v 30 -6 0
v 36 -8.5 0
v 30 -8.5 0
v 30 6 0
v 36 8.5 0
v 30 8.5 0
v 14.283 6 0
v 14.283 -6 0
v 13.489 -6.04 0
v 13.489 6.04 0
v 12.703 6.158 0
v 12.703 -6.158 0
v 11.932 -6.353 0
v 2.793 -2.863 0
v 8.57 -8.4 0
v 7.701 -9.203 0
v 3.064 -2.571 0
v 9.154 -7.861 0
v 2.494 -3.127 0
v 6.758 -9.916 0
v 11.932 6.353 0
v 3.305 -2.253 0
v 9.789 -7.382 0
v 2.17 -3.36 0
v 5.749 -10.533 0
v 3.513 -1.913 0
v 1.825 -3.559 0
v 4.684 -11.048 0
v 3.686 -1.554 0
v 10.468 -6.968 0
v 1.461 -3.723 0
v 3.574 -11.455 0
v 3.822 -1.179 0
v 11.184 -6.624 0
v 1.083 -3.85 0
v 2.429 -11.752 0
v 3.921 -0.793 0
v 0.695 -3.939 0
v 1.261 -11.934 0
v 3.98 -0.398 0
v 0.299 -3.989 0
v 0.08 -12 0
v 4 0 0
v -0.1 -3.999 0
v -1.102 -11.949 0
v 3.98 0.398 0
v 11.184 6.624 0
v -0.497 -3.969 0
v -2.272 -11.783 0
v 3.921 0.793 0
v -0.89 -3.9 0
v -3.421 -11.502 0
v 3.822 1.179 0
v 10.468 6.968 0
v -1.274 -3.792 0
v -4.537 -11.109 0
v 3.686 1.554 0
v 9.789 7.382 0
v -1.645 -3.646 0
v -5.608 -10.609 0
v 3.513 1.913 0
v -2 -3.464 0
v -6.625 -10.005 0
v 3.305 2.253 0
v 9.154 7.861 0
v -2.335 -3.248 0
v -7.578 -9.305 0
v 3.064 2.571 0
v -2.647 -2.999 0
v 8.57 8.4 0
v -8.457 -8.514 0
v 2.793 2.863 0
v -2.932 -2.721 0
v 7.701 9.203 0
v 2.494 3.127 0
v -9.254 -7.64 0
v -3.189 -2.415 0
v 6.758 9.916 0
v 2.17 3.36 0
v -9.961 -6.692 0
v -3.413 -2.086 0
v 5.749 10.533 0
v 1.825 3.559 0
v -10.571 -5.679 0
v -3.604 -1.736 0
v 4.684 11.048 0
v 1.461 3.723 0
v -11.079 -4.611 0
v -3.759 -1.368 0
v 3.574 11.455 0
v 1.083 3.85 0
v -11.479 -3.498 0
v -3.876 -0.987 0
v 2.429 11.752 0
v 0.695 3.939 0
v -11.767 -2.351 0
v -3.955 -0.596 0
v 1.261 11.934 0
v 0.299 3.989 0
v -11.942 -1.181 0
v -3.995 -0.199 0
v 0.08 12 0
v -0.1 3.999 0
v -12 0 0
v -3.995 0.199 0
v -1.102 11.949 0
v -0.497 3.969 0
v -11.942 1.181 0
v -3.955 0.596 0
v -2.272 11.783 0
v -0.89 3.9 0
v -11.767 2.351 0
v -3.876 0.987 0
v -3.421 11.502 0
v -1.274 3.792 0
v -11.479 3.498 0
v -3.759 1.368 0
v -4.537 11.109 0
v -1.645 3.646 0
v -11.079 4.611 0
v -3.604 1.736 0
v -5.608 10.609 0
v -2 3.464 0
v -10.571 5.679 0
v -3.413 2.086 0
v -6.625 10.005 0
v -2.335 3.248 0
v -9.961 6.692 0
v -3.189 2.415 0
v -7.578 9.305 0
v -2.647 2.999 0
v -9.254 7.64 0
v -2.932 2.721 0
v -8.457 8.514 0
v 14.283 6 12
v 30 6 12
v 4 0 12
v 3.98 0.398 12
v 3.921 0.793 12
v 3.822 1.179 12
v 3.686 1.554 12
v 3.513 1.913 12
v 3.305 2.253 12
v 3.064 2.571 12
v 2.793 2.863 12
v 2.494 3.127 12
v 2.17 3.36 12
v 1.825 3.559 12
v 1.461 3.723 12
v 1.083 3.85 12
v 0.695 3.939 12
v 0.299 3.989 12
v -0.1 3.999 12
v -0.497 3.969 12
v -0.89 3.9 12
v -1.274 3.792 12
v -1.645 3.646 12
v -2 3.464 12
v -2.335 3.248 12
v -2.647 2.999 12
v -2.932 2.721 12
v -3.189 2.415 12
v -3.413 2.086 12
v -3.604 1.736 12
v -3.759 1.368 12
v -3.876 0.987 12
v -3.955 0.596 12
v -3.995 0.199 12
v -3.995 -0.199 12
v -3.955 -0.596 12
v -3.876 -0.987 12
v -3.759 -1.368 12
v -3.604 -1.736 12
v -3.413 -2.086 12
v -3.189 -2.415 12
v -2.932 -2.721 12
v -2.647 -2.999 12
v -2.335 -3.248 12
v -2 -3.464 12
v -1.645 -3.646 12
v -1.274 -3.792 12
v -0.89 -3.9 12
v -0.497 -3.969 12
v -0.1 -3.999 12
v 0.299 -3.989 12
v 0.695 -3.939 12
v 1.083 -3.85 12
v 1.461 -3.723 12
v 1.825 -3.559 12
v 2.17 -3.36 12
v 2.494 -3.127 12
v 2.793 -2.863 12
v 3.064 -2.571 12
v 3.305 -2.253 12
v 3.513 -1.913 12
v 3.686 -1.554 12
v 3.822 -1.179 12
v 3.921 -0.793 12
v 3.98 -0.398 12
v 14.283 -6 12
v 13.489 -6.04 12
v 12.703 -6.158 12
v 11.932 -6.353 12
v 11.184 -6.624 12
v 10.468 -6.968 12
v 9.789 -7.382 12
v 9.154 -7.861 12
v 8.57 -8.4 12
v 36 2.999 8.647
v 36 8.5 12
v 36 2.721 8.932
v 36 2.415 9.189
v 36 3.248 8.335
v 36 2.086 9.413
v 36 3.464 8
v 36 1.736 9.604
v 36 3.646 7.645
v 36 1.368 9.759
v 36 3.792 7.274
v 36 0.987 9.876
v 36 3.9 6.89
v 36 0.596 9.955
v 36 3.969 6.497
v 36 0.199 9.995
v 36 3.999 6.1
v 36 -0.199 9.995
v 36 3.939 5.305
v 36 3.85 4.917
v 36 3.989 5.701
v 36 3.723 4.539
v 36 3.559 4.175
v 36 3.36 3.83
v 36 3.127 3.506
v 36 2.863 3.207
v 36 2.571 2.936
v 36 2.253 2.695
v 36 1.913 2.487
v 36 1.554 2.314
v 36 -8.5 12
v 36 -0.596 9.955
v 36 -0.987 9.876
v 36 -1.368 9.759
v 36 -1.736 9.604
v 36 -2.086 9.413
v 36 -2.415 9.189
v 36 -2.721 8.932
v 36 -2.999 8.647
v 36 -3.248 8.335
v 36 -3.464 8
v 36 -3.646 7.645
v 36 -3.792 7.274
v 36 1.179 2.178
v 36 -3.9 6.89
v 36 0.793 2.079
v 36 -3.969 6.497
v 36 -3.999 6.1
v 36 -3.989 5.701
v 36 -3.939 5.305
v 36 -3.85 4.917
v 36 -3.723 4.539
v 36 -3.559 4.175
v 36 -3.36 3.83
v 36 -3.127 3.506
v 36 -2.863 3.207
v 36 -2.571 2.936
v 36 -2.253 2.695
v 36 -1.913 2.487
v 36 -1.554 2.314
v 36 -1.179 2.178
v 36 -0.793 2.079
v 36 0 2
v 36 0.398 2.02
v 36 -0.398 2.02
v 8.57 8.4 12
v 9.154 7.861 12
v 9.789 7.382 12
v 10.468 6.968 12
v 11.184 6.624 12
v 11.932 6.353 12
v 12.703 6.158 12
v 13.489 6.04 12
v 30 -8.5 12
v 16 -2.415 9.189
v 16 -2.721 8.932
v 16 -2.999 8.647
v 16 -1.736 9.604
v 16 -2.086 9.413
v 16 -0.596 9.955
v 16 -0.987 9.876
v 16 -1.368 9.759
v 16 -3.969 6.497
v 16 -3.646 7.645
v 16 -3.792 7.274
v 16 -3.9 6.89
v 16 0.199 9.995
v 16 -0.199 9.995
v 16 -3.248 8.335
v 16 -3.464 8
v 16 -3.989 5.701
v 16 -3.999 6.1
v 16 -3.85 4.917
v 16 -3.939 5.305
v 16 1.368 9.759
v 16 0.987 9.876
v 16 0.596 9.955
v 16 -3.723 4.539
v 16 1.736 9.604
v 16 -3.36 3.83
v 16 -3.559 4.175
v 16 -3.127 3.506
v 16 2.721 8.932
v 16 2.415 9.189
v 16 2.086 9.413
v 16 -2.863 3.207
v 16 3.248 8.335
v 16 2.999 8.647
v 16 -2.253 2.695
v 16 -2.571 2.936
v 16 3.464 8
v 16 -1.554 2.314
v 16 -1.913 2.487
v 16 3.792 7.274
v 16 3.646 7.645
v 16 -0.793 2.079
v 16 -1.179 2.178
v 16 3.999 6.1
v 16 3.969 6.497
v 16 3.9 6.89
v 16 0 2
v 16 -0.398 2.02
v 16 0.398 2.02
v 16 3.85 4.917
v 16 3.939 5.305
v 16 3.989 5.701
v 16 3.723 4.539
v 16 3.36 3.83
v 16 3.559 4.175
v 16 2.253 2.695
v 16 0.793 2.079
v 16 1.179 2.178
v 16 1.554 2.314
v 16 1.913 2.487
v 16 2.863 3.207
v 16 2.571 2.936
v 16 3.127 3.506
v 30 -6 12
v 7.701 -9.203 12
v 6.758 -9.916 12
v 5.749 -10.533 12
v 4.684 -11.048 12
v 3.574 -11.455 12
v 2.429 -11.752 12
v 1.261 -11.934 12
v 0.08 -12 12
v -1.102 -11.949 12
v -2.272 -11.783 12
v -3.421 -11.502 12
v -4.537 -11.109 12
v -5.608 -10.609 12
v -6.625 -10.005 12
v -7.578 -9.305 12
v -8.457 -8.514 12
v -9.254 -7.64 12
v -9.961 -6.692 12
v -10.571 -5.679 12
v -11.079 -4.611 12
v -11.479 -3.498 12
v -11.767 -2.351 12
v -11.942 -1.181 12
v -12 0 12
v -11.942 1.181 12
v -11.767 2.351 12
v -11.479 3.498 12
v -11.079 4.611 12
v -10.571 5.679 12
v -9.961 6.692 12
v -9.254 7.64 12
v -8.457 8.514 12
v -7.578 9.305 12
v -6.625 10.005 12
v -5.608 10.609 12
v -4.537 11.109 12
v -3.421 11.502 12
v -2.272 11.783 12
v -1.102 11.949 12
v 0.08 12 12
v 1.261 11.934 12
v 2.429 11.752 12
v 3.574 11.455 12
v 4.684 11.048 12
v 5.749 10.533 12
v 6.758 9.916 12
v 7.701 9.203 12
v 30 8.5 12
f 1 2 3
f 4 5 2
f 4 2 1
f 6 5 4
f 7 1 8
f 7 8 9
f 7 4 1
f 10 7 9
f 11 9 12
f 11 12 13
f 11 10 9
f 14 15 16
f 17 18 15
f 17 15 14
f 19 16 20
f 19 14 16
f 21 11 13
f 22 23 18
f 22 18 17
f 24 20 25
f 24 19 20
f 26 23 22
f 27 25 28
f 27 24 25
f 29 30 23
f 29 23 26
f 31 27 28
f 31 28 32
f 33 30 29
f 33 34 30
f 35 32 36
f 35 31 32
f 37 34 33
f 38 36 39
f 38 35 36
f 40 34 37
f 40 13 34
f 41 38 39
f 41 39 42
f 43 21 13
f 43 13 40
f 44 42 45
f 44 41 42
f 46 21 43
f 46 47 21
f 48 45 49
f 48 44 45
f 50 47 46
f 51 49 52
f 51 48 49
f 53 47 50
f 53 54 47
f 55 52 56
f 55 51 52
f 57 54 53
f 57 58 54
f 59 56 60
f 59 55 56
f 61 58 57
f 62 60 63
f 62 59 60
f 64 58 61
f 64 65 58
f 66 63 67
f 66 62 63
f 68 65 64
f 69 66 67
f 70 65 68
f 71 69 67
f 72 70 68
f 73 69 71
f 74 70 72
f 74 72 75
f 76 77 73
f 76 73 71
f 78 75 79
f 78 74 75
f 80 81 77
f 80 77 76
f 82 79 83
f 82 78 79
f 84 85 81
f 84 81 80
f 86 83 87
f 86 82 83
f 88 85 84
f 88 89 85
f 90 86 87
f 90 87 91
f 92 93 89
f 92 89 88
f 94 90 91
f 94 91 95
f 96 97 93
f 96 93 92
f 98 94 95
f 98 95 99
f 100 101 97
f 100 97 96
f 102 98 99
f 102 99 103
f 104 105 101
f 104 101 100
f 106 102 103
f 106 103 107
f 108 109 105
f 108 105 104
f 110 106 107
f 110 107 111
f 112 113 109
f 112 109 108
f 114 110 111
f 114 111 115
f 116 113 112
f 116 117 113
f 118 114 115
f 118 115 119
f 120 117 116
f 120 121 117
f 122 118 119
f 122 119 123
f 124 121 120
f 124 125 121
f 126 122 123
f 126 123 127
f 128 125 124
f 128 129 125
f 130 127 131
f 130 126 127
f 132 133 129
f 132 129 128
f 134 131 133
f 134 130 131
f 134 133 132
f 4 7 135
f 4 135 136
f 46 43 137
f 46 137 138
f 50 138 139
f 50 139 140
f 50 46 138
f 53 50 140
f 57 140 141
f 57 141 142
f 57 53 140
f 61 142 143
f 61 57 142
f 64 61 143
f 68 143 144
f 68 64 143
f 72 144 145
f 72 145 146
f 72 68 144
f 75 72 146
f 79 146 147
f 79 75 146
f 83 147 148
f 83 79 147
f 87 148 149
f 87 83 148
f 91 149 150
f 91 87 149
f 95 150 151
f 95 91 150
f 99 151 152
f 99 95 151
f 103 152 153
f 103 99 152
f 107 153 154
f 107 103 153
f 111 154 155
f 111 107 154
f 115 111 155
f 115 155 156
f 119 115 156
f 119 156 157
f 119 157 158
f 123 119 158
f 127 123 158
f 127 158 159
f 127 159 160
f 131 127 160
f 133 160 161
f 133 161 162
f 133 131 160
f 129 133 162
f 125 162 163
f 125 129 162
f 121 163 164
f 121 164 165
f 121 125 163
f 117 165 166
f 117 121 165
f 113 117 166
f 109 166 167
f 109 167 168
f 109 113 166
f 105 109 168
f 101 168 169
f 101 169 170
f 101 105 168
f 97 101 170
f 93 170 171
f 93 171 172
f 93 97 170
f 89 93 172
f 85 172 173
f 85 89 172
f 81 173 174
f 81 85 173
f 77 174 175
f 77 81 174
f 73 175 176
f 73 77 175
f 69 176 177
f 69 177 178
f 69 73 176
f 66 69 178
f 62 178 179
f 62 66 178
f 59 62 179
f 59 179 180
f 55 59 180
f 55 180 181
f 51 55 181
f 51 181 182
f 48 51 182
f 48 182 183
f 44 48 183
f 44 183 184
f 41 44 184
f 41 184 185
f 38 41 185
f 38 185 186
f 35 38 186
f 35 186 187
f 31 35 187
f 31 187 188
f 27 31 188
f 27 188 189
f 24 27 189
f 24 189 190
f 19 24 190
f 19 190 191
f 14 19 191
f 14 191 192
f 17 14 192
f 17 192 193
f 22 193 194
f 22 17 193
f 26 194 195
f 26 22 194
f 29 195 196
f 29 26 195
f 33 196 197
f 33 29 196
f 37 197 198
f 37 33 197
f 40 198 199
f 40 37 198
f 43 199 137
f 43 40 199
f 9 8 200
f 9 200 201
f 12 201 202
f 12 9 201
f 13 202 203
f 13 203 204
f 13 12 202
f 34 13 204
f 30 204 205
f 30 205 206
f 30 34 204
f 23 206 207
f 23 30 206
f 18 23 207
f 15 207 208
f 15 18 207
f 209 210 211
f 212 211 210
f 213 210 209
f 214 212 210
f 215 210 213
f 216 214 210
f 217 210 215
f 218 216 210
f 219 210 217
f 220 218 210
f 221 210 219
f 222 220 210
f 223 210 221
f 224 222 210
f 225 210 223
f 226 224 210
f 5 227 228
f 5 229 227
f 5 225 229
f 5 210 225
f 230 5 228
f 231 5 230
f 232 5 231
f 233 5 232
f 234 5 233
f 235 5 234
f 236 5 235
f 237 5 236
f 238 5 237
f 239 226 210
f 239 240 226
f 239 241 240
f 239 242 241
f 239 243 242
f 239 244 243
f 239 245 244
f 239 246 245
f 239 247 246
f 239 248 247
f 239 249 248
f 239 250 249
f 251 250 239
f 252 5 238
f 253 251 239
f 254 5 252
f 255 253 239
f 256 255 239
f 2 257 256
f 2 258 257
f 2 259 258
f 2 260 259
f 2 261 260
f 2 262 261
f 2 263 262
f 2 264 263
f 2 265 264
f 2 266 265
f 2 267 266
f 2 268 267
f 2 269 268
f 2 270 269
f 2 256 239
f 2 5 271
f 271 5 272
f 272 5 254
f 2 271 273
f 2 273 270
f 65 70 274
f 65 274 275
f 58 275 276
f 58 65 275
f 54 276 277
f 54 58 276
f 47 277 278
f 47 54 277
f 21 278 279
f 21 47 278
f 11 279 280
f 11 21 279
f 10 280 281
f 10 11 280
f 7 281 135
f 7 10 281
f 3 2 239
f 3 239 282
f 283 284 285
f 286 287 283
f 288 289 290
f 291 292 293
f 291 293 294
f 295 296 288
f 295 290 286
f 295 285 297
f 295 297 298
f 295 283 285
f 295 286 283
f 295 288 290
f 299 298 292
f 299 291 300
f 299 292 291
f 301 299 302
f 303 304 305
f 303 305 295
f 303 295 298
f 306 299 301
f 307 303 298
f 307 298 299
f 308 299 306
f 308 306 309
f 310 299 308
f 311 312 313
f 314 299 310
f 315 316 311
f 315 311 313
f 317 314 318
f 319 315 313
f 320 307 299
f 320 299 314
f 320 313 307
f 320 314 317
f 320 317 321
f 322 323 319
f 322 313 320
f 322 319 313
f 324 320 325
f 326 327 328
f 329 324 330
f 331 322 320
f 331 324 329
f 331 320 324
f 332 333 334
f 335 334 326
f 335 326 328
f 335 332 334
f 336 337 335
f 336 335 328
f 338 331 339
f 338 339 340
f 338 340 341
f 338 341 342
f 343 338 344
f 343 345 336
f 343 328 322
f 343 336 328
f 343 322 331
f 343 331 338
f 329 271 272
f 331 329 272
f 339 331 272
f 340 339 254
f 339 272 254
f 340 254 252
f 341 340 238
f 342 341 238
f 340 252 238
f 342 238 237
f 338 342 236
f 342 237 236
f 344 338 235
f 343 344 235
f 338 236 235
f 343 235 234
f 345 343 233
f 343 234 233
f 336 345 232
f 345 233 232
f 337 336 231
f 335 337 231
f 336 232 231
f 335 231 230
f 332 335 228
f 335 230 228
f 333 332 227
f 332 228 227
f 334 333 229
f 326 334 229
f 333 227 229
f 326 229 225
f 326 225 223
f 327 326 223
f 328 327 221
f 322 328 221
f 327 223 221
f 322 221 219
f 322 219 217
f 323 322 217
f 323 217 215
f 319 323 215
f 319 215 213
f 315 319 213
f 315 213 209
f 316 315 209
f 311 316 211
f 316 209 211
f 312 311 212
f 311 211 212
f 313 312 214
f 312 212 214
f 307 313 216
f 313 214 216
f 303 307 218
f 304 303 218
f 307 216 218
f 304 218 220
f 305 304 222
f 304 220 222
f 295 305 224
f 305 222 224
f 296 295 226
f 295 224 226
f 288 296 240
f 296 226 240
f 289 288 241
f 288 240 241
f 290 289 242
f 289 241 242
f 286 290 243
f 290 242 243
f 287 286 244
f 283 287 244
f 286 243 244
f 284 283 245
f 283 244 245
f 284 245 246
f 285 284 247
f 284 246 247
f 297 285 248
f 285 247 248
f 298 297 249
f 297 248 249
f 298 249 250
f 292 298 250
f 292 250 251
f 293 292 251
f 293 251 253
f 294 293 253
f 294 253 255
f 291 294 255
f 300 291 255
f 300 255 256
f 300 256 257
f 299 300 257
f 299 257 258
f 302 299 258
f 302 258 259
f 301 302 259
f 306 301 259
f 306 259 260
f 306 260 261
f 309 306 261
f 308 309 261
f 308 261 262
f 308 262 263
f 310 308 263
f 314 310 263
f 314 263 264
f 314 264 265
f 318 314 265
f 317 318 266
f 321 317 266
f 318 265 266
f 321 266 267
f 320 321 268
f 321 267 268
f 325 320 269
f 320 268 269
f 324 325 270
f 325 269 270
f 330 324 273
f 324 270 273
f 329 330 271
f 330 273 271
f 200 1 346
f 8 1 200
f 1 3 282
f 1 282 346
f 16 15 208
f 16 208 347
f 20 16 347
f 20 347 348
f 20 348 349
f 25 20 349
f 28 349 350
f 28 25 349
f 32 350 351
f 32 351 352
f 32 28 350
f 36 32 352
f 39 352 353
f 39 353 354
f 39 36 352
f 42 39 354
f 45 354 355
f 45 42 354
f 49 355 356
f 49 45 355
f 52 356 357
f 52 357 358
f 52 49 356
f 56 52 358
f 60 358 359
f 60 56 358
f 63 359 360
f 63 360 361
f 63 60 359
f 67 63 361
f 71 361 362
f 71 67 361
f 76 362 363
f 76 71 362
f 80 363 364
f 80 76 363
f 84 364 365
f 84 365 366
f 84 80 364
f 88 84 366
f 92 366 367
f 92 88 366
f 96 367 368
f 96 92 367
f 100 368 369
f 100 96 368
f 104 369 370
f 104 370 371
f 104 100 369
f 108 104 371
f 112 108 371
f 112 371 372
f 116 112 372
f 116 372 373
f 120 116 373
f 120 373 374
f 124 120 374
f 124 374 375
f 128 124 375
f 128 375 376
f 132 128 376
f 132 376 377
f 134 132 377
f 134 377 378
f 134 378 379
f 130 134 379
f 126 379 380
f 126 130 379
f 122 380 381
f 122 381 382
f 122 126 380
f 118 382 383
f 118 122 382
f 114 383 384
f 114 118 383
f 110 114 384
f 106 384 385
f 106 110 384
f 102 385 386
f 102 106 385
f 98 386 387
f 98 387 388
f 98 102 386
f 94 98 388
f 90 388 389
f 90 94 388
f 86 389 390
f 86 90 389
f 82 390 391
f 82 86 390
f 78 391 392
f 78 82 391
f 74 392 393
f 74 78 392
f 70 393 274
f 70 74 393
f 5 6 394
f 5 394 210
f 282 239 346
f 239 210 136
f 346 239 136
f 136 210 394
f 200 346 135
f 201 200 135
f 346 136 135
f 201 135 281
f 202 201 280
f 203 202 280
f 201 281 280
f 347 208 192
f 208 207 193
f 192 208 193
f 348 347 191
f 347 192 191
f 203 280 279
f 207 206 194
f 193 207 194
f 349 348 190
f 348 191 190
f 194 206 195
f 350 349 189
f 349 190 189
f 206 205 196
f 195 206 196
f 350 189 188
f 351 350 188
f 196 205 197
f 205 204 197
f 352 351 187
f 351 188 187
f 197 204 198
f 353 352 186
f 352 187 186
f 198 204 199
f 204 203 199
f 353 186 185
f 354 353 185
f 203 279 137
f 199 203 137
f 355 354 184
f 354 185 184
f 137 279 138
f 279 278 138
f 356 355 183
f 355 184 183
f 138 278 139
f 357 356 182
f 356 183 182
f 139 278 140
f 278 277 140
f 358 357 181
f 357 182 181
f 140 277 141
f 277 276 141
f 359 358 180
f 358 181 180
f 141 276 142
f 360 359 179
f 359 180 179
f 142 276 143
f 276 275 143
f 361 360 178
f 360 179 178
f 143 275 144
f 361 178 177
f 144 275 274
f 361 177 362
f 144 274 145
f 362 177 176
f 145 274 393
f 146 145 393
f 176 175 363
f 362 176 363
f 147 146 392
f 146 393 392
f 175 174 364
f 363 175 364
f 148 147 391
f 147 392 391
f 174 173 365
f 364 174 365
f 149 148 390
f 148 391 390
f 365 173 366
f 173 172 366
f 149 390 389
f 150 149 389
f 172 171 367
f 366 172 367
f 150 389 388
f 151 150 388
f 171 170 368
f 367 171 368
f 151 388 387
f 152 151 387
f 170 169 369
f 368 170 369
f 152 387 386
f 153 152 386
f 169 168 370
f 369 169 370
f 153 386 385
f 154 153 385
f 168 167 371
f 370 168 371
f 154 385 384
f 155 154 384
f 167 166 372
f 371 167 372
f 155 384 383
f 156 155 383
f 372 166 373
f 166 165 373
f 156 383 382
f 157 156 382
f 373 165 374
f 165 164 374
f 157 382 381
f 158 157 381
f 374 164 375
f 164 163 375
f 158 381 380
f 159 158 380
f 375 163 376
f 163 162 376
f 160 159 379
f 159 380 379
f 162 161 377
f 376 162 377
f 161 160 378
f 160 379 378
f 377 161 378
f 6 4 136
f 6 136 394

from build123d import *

# Parameters (mm, degrees)
SKETCH_2_R          = 4
EXTRUDE_1_DEPTH     = 12
SKETCH_3_R          = 4
CUT_EXTRUDE_1_DEPTH = 20


with BuildPart() as part:
    # 草图2 → 凸台-拉伸1 (new body)
    with BuildSketch(Plane.XY):
        with BuildLine():
            Line((14.282856857, 6), (30, 6))
            Line((30, 6), (30, 8.5))
            Line((30, 8.5), (36, 8.5))
            Line((36, 8.5), (36, 0))
            Line((36, 0), (36, -8.5))
            Line((36, -8.5), (30, -8.5))
            Line((30, -8.5), (30, -6))
            Line((30, -6), (14.282856857, -6))
            ThreePointArc((14.282856857, -6), (11.18447018, -6.624364434), (8.569714114, -8.4))
            ThreePointArc((8.569714114, -8.4), (-12, 0), (8.569714114, 8.4))
            ThreePointArc((8.569714114, 8.4), (11.18447018, 6.624364434), (14.282856857, 6))
        make_face()
        Circle(SKETCH_2_R, mode=Mode.SUBTRACT)
    extrude(amount=EXTRUDE_1_DEPTH)

    # 草图3 → 切除-拉伸1 (cut)
    with BuildSketch(Plane(origin=(36, 0, 0), x_dir=(0, 0, -1), z_dir=(1, 0, 0))):
        with Locations((-6, 0)):
            Circle(SKETCH_3_R)
    extrude(amount=-CUT_EXTRUDE_1_DEPTH, mode=Mode.SUBTRACT)


solid = part.part
